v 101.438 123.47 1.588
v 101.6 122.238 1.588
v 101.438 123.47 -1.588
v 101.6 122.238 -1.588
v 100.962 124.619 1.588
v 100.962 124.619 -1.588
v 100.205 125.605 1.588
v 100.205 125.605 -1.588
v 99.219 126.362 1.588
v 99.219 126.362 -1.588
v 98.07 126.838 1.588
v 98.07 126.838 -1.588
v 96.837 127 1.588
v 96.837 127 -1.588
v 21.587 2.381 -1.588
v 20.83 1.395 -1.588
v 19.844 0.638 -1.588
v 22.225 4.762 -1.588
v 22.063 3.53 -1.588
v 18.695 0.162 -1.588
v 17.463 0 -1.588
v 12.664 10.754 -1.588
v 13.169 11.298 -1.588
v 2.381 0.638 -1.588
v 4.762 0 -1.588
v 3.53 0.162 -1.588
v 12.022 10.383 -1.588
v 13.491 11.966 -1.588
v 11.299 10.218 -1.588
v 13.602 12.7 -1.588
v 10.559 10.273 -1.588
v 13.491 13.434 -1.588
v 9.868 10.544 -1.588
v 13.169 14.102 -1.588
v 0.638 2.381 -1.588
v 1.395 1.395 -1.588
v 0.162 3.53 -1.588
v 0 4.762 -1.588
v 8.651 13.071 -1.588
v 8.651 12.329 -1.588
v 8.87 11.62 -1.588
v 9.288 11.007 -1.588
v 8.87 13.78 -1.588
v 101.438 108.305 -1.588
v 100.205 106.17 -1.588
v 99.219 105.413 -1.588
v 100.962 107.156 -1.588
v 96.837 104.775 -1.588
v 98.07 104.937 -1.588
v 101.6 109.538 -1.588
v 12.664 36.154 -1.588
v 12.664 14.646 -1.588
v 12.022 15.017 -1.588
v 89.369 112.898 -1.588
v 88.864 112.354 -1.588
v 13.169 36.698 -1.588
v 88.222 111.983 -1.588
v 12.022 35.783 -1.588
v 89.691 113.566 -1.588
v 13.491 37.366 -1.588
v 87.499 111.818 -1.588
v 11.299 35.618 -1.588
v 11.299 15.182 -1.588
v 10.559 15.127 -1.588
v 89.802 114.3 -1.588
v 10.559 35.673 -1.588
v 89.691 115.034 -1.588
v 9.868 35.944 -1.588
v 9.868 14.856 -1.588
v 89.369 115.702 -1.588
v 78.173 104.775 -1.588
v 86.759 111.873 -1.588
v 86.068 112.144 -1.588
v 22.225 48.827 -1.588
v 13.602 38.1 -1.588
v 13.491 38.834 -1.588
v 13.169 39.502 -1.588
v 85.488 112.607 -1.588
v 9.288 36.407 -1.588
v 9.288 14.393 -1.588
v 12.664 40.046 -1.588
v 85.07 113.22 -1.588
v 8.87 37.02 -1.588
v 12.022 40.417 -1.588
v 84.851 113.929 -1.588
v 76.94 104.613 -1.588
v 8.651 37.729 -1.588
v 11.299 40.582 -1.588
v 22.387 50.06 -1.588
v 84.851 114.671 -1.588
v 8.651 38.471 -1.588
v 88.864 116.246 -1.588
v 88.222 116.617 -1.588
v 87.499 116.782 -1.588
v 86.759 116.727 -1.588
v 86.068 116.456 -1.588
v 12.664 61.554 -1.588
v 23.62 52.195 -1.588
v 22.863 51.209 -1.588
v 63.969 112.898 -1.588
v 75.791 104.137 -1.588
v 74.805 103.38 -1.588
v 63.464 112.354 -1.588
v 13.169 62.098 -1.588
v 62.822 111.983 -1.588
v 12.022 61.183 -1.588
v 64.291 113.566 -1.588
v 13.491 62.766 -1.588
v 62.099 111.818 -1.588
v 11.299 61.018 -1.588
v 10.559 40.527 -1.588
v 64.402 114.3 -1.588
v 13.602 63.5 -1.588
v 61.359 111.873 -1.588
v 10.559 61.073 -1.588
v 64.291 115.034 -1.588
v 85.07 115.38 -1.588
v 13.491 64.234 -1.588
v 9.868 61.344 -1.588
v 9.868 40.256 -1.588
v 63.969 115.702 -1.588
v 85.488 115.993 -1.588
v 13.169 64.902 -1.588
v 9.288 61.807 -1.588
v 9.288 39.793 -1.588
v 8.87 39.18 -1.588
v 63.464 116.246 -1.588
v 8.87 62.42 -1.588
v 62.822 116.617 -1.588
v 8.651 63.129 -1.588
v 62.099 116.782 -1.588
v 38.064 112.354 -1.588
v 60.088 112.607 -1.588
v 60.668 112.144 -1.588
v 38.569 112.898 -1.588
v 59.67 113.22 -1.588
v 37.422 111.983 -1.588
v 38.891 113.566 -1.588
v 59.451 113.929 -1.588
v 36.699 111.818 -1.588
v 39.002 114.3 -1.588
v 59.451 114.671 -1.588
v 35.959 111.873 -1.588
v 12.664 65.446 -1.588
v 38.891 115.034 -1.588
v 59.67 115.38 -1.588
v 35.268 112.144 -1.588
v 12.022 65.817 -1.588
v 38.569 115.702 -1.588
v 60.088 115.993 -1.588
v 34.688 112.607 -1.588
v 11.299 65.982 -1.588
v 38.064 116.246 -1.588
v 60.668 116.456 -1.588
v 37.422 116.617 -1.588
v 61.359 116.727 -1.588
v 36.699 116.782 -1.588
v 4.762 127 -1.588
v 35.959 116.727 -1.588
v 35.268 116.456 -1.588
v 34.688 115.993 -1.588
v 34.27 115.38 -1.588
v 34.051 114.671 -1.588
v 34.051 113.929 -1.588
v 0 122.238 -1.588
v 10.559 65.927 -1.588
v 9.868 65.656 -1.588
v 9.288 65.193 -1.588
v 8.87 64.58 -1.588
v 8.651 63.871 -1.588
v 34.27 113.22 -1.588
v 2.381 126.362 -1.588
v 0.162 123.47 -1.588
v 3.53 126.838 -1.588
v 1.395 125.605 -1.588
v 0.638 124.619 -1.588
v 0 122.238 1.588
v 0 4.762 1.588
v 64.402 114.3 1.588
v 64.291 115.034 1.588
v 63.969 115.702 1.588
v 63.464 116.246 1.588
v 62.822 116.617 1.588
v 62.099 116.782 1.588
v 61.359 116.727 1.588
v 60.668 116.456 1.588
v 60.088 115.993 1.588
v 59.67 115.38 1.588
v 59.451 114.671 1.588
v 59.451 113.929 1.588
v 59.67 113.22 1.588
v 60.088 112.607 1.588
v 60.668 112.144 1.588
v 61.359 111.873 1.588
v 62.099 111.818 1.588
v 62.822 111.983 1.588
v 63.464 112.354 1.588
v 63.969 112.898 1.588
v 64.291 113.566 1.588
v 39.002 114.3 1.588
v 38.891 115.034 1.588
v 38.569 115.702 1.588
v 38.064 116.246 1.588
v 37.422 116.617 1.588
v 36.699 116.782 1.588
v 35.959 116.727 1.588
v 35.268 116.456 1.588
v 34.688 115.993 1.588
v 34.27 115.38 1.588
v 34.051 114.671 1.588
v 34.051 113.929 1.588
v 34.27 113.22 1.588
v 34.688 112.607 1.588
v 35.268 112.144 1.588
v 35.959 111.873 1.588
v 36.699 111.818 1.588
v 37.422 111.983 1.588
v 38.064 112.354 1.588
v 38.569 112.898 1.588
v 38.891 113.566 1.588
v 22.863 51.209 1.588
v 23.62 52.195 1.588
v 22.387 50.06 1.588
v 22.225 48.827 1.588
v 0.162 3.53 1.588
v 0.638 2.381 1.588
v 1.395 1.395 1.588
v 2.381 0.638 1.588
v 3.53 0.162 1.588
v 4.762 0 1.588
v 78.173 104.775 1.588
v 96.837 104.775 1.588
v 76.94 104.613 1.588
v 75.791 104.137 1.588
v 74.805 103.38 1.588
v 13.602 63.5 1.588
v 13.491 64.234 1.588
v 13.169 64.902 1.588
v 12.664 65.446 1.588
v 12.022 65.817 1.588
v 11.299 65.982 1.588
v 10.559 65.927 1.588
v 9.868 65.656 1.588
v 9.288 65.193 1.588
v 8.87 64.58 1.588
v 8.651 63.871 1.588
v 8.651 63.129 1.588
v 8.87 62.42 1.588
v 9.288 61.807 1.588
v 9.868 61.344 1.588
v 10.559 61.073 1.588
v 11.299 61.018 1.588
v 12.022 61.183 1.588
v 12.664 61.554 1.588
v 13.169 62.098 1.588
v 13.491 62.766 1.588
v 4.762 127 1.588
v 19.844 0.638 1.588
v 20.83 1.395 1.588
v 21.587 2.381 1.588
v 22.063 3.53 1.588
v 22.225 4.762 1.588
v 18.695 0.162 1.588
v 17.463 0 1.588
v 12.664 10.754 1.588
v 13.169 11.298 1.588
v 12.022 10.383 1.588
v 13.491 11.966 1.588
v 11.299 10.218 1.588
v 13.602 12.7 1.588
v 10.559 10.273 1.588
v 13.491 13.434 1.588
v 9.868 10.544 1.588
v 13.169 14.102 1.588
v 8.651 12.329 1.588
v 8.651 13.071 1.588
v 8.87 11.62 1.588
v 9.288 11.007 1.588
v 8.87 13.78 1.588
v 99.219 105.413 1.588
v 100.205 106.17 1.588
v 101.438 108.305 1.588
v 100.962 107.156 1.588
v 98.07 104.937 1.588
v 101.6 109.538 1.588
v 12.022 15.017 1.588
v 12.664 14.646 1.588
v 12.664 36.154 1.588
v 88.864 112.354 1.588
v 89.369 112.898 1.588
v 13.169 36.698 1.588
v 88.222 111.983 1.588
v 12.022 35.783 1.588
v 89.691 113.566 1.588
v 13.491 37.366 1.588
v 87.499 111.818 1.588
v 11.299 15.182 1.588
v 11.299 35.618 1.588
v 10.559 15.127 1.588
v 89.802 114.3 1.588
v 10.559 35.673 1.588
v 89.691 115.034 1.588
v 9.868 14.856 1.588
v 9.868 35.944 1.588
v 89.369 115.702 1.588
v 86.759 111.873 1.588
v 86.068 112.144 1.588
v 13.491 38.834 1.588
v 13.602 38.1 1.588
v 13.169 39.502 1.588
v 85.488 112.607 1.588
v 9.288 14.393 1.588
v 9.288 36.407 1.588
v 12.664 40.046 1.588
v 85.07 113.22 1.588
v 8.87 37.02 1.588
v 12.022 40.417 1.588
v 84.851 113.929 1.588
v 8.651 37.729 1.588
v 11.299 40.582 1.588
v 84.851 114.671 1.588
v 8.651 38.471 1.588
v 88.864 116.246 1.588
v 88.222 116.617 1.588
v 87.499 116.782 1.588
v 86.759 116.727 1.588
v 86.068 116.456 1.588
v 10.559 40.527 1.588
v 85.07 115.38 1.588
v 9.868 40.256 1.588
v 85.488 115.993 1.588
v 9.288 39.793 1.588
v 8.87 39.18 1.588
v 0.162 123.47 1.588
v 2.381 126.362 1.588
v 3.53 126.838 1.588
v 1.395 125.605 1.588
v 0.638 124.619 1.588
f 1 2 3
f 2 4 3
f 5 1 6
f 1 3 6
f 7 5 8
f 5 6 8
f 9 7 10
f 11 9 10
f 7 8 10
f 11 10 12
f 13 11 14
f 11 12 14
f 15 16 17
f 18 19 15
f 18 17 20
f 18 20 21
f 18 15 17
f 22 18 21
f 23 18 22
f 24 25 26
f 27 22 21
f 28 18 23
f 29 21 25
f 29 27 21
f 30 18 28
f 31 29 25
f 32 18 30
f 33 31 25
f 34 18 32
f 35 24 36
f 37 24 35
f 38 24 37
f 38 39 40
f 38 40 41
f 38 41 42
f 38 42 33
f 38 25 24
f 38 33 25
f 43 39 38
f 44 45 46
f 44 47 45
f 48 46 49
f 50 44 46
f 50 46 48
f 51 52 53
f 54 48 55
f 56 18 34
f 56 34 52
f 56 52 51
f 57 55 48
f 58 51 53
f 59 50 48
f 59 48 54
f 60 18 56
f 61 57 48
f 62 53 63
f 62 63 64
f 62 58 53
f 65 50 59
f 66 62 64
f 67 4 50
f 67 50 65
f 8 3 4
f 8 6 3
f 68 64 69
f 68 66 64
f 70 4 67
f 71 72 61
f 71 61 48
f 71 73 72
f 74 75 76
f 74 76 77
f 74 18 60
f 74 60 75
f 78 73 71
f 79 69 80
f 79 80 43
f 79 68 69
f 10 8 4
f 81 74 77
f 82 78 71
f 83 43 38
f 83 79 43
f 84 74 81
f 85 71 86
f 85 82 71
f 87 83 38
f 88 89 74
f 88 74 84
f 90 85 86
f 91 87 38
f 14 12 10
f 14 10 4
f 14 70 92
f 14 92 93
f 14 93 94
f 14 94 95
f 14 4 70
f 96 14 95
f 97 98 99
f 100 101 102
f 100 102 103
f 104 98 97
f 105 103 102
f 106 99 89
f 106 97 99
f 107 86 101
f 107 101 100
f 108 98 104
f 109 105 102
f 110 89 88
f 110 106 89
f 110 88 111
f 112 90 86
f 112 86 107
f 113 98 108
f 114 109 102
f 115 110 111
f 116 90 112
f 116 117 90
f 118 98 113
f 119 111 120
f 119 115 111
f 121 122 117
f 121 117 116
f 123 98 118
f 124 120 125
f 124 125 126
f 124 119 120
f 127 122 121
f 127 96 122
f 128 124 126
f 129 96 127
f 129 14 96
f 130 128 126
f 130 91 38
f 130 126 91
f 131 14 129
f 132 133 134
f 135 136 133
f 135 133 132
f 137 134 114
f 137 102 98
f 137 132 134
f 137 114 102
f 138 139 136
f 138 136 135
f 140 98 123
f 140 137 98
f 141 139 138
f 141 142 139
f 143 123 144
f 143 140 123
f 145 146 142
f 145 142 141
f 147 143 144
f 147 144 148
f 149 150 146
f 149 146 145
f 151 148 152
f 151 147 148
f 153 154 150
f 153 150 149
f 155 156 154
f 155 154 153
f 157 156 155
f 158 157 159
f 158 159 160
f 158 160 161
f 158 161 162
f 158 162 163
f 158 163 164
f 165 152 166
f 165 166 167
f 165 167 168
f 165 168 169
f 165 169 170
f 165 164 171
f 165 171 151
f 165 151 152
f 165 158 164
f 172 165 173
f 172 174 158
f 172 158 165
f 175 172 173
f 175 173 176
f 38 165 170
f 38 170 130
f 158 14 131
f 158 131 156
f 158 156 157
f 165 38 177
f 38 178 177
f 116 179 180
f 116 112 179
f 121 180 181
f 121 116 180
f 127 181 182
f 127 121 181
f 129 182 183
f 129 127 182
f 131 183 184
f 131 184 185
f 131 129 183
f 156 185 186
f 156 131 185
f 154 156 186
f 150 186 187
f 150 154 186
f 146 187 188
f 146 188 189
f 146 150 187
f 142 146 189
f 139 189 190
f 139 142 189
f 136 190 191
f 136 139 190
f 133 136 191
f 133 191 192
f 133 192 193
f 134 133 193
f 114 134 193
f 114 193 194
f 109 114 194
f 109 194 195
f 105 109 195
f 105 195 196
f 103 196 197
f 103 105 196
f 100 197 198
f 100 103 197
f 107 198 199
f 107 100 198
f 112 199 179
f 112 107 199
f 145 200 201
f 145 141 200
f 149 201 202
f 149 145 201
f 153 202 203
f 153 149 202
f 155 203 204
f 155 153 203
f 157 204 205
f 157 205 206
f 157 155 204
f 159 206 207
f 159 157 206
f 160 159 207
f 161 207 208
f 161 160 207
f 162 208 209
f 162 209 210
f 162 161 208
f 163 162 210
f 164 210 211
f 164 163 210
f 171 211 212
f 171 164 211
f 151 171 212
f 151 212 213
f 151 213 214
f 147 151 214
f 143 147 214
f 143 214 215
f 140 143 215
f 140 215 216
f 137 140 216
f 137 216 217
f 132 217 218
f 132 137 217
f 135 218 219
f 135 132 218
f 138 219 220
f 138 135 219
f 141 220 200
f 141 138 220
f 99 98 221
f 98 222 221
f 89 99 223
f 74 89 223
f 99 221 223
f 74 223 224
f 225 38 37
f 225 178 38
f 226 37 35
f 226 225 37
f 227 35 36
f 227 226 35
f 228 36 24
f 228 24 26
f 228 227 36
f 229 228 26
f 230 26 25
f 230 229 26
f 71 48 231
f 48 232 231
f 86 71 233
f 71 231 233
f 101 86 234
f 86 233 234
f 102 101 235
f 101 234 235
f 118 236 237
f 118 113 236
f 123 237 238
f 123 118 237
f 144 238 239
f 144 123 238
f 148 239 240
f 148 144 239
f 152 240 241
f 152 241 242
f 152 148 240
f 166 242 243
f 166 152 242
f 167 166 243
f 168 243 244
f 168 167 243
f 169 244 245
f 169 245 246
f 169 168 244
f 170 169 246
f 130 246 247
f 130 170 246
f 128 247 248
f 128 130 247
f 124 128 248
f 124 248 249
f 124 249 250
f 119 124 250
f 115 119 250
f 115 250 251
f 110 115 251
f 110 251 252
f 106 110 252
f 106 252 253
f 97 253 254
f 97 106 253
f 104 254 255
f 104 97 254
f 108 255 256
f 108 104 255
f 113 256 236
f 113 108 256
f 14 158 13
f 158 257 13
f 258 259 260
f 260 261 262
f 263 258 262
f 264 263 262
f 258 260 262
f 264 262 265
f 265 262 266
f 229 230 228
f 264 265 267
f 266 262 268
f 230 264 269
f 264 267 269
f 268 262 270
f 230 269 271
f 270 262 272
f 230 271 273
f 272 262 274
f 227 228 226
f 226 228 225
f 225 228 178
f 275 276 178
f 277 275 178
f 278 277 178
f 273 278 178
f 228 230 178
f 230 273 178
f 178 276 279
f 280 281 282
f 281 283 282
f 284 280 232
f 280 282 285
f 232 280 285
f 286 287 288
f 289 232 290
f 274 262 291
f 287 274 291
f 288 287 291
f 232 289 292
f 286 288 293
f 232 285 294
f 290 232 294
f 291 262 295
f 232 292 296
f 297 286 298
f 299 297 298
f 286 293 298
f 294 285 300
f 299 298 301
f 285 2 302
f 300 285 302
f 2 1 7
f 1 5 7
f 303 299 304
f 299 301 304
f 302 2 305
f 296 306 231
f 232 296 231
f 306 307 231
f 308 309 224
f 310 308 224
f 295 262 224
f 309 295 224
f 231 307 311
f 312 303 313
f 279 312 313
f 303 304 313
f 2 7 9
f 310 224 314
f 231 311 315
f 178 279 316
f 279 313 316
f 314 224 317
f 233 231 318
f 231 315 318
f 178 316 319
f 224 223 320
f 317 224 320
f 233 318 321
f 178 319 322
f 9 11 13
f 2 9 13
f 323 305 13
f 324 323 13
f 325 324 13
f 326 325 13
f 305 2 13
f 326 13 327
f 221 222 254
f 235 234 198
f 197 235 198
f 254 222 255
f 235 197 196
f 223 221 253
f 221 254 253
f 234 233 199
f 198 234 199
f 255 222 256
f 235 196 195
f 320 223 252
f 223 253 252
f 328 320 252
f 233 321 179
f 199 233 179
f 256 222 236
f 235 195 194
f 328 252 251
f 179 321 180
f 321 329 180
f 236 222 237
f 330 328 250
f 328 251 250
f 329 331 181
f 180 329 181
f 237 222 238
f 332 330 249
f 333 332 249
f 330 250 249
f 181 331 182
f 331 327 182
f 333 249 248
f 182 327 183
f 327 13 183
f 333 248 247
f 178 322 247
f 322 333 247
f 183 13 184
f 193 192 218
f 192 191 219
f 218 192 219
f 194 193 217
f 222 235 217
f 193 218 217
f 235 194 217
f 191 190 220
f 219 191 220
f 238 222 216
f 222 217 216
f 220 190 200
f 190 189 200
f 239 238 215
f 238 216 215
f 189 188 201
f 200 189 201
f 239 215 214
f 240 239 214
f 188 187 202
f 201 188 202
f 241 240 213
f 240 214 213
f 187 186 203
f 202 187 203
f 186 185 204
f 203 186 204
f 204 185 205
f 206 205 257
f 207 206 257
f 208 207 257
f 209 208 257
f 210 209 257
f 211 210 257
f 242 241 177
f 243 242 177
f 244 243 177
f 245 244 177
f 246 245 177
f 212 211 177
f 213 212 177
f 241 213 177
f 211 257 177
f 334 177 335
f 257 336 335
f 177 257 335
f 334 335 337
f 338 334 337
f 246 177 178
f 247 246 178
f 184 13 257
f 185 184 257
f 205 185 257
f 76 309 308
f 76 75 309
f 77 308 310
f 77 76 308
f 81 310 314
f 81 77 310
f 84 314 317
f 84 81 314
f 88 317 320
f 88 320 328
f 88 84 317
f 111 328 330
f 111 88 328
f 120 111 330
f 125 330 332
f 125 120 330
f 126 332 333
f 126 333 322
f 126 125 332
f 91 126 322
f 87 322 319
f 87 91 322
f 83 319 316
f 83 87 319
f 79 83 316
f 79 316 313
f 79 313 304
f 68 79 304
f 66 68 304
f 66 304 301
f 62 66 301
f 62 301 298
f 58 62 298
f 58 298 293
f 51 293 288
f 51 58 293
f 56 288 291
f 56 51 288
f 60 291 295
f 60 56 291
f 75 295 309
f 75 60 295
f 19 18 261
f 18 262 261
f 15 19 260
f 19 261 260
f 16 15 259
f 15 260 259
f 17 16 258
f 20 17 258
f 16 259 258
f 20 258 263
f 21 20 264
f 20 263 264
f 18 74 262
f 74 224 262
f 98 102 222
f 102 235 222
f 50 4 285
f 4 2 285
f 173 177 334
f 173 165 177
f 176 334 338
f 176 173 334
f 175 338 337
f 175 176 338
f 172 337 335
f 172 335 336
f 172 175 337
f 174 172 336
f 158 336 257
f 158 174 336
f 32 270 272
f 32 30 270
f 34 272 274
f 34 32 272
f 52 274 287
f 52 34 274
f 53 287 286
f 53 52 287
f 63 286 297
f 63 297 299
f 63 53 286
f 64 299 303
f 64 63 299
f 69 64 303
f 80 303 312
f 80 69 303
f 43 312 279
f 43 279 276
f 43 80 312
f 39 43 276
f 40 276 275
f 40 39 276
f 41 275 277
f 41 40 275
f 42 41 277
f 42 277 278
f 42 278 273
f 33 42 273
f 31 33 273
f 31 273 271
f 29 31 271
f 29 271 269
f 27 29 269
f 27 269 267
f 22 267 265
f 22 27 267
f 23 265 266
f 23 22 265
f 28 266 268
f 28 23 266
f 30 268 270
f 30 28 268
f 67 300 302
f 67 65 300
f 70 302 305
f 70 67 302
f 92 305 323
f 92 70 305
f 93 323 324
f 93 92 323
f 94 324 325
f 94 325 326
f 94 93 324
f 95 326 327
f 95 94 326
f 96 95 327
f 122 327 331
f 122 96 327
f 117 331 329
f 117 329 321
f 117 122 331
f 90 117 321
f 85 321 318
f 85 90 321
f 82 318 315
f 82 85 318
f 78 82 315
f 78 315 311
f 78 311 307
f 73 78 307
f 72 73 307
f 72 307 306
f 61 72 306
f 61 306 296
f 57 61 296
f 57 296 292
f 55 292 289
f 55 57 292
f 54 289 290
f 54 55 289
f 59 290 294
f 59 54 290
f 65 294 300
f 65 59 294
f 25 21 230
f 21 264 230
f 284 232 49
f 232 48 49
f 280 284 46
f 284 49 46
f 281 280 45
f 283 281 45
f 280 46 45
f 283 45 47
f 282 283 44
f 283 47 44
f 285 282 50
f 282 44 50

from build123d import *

# Parameters (mm, degrees)
SKETCH1_R           = 2.4892
BOSS_EXTRUDE1_DEPTH = 1.5875
FILLET1_R           = 4.7625


with BuildPart() as part:
    # Sketch1 → Boss-Extrude1 (new, symmetric)
    with BuildSketch(Plane.XY):
        Polygon((0, 0), (0, 127), (101.6, 127), (101.6, 104.775), (76.2, 104.775), (22.225, 50.8), (22.225, 0), align=None)
        with Locations((11.1125, 63.5)):
            Circle(SKETCH1_R, mode=Mode.SUBTRACT)
        with Locations((11.1125, 38.1)):
            Circle(SKETCH1_R, mode=Mode.SUBTRACT)
        with Locations((11.1125, 12.7)):
            Circle(SKETCH1_R, mode=Mode.SUBTRACT)
        with Locations((87.3125, 114.3)):
            Circle(SKETCH1_R, mode=Mode.SUBTRACT)
        with Locations((61.9125, 114.3)):
            Circle(SKETCH1_R, mode=Mode.SUBTRACT)
        with Locations((36.5125, 114.3)):
            Circle(SKETCH1_R, mode=Mode.SUBTRACT)
    extrude(amount=BOSS_EXTRUDE1_DEPTH, both=True)

    # Fillet1
    fillet1_edges = [part.edges().sort_by_distance(p)[0] for p in [
        (22.225, 0, 0),
        (22.225, 50.8, 0),
        (76.2, 104.775, 0),
        (101.6, 104.775, 0),
        (101.6, 127, 0),
        (0, 127, 0),
        (0, 0, 0),
    ]]
    fillet(fillet1_edges, radius=FILLET1_R)


solid = part.part
